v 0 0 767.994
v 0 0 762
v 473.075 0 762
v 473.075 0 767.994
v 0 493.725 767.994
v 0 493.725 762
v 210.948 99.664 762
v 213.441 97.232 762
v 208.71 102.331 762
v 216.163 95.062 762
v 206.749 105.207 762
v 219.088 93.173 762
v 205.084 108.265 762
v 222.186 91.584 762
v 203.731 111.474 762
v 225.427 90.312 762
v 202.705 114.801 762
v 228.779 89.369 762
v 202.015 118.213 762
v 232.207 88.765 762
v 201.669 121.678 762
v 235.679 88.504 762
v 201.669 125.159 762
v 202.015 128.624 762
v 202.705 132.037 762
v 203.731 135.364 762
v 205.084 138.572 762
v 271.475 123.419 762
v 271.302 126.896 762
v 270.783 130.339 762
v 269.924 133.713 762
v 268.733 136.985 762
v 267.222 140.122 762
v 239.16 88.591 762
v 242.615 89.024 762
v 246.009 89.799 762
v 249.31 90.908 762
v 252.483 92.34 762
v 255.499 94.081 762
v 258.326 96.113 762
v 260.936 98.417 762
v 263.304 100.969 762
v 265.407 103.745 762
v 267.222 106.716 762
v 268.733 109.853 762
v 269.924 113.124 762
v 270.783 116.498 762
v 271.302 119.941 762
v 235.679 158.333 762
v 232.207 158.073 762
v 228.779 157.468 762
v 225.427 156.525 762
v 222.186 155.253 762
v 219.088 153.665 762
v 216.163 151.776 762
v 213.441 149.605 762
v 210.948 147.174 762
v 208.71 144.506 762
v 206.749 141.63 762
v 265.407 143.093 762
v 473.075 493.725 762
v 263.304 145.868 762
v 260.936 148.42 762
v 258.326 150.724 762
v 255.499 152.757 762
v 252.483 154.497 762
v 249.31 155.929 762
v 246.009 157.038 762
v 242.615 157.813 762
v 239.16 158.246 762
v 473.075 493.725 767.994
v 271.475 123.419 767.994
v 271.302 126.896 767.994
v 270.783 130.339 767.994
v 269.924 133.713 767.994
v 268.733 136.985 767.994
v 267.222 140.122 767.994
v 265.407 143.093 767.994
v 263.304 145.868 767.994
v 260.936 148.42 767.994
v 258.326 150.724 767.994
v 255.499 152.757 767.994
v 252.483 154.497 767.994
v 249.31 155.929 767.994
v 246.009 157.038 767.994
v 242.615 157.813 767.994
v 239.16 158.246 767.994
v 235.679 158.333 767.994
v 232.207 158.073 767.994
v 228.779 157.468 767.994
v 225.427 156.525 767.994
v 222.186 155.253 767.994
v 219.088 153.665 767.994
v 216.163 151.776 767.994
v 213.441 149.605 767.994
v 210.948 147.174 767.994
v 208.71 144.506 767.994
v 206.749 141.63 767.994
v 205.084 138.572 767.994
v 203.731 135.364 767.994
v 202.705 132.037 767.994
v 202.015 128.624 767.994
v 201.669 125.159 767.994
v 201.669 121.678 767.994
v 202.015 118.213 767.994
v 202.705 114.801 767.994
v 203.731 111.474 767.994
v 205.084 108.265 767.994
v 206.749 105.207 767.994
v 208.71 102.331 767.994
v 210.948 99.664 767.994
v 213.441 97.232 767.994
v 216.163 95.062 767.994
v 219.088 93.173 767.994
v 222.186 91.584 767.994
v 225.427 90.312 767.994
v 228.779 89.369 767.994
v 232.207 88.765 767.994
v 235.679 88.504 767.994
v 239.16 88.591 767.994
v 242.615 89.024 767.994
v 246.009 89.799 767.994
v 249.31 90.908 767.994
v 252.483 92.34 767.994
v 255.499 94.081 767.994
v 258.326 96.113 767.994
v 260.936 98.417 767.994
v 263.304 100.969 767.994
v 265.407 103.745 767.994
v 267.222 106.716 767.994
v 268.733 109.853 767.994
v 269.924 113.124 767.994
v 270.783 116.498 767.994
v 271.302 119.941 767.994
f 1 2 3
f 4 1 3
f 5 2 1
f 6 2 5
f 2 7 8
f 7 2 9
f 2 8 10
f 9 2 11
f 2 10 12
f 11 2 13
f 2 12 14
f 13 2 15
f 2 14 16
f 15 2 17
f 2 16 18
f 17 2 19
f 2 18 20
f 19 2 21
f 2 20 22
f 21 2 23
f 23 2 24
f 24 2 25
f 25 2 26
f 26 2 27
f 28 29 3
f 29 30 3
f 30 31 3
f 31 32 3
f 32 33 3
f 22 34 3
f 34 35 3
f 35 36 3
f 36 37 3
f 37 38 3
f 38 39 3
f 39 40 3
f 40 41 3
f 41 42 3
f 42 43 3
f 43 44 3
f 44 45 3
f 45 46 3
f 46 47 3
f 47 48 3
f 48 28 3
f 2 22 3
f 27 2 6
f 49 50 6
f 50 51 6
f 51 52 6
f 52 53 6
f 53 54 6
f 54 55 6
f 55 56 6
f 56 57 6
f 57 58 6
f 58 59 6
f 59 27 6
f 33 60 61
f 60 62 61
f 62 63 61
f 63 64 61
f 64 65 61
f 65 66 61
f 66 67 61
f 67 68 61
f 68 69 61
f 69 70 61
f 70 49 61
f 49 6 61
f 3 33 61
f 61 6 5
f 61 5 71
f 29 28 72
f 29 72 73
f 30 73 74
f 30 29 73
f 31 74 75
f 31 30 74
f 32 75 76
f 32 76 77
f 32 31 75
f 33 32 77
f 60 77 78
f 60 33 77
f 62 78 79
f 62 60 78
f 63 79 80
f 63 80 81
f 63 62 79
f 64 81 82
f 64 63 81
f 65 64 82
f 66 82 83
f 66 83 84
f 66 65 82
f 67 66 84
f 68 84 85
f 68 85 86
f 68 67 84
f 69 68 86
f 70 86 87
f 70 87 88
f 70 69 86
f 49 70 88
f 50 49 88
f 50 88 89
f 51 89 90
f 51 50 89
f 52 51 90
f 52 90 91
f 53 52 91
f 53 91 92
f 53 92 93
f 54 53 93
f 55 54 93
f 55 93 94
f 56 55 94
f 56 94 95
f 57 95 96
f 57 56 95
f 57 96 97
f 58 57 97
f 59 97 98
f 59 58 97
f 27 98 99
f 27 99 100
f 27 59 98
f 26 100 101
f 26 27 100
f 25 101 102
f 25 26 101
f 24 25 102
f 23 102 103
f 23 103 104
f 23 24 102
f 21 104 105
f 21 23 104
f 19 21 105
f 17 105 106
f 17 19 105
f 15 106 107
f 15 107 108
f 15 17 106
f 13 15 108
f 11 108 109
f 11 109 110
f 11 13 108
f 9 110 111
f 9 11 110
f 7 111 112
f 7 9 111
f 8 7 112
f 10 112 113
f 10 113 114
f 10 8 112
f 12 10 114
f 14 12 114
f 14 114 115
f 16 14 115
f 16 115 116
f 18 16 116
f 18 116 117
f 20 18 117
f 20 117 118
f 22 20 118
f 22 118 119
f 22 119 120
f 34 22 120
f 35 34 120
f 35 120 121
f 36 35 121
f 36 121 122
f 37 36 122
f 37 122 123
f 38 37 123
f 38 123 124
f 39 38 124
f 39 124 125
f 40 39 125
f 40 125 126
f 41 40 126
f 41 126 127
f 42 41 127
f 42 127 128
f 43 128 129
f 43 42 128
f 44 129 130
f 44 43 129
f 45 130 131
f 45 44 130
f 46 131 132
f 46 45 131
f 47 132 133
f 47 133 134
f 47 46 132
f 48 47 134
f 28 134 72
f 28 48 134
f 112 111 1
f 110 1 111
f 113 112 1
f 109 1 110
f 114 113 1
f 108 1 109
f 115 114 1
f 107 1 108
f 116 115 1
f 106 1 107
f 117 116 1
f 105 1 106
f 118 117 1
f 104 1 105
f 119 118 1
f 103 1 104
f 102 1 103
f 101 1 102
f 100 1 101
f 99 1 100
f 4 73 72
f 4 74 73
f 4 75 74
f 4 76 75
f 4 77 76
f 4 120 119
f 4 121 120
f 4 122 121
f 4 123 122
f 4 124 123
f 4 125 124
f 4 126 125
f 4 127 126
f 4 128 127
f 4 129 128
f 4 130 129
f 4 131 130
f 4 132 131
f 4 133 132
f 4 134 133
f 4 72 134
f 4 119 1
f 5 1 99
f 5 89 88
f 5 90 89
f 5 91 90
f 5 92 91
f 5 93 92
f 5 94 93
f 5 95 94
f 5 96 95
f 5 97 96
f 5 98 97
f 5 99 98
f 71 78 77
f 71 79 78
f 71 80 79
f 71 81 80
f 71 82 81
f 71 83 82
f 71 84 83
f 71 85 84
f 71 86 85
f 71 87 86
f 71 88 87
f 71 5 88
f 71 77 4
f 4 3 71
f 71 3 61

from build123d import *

# Parameters (mm, degrees)
SKETCH_W      = 473.075
SKETCH_H      = 493.7252
SKETCH_R      = 34.925
EXTRUDE_DEPTH = 5.9944


with BuildPart() as part:
    # Sketch → Extrude (new body)
    with BuildSketch(Plane.XY.offset(762)):
        with Locations((236.5375, 246.8626)):
            Rectangle(SKETCH_W, SKETCH_H)
        with Locations((236.5502, 123.4186)):
            Circle(SKETCH_R, mode=Mode.SUBTRACT)
    extrude(amount=EXTRUDE_DEPTH)


solid = part.part
